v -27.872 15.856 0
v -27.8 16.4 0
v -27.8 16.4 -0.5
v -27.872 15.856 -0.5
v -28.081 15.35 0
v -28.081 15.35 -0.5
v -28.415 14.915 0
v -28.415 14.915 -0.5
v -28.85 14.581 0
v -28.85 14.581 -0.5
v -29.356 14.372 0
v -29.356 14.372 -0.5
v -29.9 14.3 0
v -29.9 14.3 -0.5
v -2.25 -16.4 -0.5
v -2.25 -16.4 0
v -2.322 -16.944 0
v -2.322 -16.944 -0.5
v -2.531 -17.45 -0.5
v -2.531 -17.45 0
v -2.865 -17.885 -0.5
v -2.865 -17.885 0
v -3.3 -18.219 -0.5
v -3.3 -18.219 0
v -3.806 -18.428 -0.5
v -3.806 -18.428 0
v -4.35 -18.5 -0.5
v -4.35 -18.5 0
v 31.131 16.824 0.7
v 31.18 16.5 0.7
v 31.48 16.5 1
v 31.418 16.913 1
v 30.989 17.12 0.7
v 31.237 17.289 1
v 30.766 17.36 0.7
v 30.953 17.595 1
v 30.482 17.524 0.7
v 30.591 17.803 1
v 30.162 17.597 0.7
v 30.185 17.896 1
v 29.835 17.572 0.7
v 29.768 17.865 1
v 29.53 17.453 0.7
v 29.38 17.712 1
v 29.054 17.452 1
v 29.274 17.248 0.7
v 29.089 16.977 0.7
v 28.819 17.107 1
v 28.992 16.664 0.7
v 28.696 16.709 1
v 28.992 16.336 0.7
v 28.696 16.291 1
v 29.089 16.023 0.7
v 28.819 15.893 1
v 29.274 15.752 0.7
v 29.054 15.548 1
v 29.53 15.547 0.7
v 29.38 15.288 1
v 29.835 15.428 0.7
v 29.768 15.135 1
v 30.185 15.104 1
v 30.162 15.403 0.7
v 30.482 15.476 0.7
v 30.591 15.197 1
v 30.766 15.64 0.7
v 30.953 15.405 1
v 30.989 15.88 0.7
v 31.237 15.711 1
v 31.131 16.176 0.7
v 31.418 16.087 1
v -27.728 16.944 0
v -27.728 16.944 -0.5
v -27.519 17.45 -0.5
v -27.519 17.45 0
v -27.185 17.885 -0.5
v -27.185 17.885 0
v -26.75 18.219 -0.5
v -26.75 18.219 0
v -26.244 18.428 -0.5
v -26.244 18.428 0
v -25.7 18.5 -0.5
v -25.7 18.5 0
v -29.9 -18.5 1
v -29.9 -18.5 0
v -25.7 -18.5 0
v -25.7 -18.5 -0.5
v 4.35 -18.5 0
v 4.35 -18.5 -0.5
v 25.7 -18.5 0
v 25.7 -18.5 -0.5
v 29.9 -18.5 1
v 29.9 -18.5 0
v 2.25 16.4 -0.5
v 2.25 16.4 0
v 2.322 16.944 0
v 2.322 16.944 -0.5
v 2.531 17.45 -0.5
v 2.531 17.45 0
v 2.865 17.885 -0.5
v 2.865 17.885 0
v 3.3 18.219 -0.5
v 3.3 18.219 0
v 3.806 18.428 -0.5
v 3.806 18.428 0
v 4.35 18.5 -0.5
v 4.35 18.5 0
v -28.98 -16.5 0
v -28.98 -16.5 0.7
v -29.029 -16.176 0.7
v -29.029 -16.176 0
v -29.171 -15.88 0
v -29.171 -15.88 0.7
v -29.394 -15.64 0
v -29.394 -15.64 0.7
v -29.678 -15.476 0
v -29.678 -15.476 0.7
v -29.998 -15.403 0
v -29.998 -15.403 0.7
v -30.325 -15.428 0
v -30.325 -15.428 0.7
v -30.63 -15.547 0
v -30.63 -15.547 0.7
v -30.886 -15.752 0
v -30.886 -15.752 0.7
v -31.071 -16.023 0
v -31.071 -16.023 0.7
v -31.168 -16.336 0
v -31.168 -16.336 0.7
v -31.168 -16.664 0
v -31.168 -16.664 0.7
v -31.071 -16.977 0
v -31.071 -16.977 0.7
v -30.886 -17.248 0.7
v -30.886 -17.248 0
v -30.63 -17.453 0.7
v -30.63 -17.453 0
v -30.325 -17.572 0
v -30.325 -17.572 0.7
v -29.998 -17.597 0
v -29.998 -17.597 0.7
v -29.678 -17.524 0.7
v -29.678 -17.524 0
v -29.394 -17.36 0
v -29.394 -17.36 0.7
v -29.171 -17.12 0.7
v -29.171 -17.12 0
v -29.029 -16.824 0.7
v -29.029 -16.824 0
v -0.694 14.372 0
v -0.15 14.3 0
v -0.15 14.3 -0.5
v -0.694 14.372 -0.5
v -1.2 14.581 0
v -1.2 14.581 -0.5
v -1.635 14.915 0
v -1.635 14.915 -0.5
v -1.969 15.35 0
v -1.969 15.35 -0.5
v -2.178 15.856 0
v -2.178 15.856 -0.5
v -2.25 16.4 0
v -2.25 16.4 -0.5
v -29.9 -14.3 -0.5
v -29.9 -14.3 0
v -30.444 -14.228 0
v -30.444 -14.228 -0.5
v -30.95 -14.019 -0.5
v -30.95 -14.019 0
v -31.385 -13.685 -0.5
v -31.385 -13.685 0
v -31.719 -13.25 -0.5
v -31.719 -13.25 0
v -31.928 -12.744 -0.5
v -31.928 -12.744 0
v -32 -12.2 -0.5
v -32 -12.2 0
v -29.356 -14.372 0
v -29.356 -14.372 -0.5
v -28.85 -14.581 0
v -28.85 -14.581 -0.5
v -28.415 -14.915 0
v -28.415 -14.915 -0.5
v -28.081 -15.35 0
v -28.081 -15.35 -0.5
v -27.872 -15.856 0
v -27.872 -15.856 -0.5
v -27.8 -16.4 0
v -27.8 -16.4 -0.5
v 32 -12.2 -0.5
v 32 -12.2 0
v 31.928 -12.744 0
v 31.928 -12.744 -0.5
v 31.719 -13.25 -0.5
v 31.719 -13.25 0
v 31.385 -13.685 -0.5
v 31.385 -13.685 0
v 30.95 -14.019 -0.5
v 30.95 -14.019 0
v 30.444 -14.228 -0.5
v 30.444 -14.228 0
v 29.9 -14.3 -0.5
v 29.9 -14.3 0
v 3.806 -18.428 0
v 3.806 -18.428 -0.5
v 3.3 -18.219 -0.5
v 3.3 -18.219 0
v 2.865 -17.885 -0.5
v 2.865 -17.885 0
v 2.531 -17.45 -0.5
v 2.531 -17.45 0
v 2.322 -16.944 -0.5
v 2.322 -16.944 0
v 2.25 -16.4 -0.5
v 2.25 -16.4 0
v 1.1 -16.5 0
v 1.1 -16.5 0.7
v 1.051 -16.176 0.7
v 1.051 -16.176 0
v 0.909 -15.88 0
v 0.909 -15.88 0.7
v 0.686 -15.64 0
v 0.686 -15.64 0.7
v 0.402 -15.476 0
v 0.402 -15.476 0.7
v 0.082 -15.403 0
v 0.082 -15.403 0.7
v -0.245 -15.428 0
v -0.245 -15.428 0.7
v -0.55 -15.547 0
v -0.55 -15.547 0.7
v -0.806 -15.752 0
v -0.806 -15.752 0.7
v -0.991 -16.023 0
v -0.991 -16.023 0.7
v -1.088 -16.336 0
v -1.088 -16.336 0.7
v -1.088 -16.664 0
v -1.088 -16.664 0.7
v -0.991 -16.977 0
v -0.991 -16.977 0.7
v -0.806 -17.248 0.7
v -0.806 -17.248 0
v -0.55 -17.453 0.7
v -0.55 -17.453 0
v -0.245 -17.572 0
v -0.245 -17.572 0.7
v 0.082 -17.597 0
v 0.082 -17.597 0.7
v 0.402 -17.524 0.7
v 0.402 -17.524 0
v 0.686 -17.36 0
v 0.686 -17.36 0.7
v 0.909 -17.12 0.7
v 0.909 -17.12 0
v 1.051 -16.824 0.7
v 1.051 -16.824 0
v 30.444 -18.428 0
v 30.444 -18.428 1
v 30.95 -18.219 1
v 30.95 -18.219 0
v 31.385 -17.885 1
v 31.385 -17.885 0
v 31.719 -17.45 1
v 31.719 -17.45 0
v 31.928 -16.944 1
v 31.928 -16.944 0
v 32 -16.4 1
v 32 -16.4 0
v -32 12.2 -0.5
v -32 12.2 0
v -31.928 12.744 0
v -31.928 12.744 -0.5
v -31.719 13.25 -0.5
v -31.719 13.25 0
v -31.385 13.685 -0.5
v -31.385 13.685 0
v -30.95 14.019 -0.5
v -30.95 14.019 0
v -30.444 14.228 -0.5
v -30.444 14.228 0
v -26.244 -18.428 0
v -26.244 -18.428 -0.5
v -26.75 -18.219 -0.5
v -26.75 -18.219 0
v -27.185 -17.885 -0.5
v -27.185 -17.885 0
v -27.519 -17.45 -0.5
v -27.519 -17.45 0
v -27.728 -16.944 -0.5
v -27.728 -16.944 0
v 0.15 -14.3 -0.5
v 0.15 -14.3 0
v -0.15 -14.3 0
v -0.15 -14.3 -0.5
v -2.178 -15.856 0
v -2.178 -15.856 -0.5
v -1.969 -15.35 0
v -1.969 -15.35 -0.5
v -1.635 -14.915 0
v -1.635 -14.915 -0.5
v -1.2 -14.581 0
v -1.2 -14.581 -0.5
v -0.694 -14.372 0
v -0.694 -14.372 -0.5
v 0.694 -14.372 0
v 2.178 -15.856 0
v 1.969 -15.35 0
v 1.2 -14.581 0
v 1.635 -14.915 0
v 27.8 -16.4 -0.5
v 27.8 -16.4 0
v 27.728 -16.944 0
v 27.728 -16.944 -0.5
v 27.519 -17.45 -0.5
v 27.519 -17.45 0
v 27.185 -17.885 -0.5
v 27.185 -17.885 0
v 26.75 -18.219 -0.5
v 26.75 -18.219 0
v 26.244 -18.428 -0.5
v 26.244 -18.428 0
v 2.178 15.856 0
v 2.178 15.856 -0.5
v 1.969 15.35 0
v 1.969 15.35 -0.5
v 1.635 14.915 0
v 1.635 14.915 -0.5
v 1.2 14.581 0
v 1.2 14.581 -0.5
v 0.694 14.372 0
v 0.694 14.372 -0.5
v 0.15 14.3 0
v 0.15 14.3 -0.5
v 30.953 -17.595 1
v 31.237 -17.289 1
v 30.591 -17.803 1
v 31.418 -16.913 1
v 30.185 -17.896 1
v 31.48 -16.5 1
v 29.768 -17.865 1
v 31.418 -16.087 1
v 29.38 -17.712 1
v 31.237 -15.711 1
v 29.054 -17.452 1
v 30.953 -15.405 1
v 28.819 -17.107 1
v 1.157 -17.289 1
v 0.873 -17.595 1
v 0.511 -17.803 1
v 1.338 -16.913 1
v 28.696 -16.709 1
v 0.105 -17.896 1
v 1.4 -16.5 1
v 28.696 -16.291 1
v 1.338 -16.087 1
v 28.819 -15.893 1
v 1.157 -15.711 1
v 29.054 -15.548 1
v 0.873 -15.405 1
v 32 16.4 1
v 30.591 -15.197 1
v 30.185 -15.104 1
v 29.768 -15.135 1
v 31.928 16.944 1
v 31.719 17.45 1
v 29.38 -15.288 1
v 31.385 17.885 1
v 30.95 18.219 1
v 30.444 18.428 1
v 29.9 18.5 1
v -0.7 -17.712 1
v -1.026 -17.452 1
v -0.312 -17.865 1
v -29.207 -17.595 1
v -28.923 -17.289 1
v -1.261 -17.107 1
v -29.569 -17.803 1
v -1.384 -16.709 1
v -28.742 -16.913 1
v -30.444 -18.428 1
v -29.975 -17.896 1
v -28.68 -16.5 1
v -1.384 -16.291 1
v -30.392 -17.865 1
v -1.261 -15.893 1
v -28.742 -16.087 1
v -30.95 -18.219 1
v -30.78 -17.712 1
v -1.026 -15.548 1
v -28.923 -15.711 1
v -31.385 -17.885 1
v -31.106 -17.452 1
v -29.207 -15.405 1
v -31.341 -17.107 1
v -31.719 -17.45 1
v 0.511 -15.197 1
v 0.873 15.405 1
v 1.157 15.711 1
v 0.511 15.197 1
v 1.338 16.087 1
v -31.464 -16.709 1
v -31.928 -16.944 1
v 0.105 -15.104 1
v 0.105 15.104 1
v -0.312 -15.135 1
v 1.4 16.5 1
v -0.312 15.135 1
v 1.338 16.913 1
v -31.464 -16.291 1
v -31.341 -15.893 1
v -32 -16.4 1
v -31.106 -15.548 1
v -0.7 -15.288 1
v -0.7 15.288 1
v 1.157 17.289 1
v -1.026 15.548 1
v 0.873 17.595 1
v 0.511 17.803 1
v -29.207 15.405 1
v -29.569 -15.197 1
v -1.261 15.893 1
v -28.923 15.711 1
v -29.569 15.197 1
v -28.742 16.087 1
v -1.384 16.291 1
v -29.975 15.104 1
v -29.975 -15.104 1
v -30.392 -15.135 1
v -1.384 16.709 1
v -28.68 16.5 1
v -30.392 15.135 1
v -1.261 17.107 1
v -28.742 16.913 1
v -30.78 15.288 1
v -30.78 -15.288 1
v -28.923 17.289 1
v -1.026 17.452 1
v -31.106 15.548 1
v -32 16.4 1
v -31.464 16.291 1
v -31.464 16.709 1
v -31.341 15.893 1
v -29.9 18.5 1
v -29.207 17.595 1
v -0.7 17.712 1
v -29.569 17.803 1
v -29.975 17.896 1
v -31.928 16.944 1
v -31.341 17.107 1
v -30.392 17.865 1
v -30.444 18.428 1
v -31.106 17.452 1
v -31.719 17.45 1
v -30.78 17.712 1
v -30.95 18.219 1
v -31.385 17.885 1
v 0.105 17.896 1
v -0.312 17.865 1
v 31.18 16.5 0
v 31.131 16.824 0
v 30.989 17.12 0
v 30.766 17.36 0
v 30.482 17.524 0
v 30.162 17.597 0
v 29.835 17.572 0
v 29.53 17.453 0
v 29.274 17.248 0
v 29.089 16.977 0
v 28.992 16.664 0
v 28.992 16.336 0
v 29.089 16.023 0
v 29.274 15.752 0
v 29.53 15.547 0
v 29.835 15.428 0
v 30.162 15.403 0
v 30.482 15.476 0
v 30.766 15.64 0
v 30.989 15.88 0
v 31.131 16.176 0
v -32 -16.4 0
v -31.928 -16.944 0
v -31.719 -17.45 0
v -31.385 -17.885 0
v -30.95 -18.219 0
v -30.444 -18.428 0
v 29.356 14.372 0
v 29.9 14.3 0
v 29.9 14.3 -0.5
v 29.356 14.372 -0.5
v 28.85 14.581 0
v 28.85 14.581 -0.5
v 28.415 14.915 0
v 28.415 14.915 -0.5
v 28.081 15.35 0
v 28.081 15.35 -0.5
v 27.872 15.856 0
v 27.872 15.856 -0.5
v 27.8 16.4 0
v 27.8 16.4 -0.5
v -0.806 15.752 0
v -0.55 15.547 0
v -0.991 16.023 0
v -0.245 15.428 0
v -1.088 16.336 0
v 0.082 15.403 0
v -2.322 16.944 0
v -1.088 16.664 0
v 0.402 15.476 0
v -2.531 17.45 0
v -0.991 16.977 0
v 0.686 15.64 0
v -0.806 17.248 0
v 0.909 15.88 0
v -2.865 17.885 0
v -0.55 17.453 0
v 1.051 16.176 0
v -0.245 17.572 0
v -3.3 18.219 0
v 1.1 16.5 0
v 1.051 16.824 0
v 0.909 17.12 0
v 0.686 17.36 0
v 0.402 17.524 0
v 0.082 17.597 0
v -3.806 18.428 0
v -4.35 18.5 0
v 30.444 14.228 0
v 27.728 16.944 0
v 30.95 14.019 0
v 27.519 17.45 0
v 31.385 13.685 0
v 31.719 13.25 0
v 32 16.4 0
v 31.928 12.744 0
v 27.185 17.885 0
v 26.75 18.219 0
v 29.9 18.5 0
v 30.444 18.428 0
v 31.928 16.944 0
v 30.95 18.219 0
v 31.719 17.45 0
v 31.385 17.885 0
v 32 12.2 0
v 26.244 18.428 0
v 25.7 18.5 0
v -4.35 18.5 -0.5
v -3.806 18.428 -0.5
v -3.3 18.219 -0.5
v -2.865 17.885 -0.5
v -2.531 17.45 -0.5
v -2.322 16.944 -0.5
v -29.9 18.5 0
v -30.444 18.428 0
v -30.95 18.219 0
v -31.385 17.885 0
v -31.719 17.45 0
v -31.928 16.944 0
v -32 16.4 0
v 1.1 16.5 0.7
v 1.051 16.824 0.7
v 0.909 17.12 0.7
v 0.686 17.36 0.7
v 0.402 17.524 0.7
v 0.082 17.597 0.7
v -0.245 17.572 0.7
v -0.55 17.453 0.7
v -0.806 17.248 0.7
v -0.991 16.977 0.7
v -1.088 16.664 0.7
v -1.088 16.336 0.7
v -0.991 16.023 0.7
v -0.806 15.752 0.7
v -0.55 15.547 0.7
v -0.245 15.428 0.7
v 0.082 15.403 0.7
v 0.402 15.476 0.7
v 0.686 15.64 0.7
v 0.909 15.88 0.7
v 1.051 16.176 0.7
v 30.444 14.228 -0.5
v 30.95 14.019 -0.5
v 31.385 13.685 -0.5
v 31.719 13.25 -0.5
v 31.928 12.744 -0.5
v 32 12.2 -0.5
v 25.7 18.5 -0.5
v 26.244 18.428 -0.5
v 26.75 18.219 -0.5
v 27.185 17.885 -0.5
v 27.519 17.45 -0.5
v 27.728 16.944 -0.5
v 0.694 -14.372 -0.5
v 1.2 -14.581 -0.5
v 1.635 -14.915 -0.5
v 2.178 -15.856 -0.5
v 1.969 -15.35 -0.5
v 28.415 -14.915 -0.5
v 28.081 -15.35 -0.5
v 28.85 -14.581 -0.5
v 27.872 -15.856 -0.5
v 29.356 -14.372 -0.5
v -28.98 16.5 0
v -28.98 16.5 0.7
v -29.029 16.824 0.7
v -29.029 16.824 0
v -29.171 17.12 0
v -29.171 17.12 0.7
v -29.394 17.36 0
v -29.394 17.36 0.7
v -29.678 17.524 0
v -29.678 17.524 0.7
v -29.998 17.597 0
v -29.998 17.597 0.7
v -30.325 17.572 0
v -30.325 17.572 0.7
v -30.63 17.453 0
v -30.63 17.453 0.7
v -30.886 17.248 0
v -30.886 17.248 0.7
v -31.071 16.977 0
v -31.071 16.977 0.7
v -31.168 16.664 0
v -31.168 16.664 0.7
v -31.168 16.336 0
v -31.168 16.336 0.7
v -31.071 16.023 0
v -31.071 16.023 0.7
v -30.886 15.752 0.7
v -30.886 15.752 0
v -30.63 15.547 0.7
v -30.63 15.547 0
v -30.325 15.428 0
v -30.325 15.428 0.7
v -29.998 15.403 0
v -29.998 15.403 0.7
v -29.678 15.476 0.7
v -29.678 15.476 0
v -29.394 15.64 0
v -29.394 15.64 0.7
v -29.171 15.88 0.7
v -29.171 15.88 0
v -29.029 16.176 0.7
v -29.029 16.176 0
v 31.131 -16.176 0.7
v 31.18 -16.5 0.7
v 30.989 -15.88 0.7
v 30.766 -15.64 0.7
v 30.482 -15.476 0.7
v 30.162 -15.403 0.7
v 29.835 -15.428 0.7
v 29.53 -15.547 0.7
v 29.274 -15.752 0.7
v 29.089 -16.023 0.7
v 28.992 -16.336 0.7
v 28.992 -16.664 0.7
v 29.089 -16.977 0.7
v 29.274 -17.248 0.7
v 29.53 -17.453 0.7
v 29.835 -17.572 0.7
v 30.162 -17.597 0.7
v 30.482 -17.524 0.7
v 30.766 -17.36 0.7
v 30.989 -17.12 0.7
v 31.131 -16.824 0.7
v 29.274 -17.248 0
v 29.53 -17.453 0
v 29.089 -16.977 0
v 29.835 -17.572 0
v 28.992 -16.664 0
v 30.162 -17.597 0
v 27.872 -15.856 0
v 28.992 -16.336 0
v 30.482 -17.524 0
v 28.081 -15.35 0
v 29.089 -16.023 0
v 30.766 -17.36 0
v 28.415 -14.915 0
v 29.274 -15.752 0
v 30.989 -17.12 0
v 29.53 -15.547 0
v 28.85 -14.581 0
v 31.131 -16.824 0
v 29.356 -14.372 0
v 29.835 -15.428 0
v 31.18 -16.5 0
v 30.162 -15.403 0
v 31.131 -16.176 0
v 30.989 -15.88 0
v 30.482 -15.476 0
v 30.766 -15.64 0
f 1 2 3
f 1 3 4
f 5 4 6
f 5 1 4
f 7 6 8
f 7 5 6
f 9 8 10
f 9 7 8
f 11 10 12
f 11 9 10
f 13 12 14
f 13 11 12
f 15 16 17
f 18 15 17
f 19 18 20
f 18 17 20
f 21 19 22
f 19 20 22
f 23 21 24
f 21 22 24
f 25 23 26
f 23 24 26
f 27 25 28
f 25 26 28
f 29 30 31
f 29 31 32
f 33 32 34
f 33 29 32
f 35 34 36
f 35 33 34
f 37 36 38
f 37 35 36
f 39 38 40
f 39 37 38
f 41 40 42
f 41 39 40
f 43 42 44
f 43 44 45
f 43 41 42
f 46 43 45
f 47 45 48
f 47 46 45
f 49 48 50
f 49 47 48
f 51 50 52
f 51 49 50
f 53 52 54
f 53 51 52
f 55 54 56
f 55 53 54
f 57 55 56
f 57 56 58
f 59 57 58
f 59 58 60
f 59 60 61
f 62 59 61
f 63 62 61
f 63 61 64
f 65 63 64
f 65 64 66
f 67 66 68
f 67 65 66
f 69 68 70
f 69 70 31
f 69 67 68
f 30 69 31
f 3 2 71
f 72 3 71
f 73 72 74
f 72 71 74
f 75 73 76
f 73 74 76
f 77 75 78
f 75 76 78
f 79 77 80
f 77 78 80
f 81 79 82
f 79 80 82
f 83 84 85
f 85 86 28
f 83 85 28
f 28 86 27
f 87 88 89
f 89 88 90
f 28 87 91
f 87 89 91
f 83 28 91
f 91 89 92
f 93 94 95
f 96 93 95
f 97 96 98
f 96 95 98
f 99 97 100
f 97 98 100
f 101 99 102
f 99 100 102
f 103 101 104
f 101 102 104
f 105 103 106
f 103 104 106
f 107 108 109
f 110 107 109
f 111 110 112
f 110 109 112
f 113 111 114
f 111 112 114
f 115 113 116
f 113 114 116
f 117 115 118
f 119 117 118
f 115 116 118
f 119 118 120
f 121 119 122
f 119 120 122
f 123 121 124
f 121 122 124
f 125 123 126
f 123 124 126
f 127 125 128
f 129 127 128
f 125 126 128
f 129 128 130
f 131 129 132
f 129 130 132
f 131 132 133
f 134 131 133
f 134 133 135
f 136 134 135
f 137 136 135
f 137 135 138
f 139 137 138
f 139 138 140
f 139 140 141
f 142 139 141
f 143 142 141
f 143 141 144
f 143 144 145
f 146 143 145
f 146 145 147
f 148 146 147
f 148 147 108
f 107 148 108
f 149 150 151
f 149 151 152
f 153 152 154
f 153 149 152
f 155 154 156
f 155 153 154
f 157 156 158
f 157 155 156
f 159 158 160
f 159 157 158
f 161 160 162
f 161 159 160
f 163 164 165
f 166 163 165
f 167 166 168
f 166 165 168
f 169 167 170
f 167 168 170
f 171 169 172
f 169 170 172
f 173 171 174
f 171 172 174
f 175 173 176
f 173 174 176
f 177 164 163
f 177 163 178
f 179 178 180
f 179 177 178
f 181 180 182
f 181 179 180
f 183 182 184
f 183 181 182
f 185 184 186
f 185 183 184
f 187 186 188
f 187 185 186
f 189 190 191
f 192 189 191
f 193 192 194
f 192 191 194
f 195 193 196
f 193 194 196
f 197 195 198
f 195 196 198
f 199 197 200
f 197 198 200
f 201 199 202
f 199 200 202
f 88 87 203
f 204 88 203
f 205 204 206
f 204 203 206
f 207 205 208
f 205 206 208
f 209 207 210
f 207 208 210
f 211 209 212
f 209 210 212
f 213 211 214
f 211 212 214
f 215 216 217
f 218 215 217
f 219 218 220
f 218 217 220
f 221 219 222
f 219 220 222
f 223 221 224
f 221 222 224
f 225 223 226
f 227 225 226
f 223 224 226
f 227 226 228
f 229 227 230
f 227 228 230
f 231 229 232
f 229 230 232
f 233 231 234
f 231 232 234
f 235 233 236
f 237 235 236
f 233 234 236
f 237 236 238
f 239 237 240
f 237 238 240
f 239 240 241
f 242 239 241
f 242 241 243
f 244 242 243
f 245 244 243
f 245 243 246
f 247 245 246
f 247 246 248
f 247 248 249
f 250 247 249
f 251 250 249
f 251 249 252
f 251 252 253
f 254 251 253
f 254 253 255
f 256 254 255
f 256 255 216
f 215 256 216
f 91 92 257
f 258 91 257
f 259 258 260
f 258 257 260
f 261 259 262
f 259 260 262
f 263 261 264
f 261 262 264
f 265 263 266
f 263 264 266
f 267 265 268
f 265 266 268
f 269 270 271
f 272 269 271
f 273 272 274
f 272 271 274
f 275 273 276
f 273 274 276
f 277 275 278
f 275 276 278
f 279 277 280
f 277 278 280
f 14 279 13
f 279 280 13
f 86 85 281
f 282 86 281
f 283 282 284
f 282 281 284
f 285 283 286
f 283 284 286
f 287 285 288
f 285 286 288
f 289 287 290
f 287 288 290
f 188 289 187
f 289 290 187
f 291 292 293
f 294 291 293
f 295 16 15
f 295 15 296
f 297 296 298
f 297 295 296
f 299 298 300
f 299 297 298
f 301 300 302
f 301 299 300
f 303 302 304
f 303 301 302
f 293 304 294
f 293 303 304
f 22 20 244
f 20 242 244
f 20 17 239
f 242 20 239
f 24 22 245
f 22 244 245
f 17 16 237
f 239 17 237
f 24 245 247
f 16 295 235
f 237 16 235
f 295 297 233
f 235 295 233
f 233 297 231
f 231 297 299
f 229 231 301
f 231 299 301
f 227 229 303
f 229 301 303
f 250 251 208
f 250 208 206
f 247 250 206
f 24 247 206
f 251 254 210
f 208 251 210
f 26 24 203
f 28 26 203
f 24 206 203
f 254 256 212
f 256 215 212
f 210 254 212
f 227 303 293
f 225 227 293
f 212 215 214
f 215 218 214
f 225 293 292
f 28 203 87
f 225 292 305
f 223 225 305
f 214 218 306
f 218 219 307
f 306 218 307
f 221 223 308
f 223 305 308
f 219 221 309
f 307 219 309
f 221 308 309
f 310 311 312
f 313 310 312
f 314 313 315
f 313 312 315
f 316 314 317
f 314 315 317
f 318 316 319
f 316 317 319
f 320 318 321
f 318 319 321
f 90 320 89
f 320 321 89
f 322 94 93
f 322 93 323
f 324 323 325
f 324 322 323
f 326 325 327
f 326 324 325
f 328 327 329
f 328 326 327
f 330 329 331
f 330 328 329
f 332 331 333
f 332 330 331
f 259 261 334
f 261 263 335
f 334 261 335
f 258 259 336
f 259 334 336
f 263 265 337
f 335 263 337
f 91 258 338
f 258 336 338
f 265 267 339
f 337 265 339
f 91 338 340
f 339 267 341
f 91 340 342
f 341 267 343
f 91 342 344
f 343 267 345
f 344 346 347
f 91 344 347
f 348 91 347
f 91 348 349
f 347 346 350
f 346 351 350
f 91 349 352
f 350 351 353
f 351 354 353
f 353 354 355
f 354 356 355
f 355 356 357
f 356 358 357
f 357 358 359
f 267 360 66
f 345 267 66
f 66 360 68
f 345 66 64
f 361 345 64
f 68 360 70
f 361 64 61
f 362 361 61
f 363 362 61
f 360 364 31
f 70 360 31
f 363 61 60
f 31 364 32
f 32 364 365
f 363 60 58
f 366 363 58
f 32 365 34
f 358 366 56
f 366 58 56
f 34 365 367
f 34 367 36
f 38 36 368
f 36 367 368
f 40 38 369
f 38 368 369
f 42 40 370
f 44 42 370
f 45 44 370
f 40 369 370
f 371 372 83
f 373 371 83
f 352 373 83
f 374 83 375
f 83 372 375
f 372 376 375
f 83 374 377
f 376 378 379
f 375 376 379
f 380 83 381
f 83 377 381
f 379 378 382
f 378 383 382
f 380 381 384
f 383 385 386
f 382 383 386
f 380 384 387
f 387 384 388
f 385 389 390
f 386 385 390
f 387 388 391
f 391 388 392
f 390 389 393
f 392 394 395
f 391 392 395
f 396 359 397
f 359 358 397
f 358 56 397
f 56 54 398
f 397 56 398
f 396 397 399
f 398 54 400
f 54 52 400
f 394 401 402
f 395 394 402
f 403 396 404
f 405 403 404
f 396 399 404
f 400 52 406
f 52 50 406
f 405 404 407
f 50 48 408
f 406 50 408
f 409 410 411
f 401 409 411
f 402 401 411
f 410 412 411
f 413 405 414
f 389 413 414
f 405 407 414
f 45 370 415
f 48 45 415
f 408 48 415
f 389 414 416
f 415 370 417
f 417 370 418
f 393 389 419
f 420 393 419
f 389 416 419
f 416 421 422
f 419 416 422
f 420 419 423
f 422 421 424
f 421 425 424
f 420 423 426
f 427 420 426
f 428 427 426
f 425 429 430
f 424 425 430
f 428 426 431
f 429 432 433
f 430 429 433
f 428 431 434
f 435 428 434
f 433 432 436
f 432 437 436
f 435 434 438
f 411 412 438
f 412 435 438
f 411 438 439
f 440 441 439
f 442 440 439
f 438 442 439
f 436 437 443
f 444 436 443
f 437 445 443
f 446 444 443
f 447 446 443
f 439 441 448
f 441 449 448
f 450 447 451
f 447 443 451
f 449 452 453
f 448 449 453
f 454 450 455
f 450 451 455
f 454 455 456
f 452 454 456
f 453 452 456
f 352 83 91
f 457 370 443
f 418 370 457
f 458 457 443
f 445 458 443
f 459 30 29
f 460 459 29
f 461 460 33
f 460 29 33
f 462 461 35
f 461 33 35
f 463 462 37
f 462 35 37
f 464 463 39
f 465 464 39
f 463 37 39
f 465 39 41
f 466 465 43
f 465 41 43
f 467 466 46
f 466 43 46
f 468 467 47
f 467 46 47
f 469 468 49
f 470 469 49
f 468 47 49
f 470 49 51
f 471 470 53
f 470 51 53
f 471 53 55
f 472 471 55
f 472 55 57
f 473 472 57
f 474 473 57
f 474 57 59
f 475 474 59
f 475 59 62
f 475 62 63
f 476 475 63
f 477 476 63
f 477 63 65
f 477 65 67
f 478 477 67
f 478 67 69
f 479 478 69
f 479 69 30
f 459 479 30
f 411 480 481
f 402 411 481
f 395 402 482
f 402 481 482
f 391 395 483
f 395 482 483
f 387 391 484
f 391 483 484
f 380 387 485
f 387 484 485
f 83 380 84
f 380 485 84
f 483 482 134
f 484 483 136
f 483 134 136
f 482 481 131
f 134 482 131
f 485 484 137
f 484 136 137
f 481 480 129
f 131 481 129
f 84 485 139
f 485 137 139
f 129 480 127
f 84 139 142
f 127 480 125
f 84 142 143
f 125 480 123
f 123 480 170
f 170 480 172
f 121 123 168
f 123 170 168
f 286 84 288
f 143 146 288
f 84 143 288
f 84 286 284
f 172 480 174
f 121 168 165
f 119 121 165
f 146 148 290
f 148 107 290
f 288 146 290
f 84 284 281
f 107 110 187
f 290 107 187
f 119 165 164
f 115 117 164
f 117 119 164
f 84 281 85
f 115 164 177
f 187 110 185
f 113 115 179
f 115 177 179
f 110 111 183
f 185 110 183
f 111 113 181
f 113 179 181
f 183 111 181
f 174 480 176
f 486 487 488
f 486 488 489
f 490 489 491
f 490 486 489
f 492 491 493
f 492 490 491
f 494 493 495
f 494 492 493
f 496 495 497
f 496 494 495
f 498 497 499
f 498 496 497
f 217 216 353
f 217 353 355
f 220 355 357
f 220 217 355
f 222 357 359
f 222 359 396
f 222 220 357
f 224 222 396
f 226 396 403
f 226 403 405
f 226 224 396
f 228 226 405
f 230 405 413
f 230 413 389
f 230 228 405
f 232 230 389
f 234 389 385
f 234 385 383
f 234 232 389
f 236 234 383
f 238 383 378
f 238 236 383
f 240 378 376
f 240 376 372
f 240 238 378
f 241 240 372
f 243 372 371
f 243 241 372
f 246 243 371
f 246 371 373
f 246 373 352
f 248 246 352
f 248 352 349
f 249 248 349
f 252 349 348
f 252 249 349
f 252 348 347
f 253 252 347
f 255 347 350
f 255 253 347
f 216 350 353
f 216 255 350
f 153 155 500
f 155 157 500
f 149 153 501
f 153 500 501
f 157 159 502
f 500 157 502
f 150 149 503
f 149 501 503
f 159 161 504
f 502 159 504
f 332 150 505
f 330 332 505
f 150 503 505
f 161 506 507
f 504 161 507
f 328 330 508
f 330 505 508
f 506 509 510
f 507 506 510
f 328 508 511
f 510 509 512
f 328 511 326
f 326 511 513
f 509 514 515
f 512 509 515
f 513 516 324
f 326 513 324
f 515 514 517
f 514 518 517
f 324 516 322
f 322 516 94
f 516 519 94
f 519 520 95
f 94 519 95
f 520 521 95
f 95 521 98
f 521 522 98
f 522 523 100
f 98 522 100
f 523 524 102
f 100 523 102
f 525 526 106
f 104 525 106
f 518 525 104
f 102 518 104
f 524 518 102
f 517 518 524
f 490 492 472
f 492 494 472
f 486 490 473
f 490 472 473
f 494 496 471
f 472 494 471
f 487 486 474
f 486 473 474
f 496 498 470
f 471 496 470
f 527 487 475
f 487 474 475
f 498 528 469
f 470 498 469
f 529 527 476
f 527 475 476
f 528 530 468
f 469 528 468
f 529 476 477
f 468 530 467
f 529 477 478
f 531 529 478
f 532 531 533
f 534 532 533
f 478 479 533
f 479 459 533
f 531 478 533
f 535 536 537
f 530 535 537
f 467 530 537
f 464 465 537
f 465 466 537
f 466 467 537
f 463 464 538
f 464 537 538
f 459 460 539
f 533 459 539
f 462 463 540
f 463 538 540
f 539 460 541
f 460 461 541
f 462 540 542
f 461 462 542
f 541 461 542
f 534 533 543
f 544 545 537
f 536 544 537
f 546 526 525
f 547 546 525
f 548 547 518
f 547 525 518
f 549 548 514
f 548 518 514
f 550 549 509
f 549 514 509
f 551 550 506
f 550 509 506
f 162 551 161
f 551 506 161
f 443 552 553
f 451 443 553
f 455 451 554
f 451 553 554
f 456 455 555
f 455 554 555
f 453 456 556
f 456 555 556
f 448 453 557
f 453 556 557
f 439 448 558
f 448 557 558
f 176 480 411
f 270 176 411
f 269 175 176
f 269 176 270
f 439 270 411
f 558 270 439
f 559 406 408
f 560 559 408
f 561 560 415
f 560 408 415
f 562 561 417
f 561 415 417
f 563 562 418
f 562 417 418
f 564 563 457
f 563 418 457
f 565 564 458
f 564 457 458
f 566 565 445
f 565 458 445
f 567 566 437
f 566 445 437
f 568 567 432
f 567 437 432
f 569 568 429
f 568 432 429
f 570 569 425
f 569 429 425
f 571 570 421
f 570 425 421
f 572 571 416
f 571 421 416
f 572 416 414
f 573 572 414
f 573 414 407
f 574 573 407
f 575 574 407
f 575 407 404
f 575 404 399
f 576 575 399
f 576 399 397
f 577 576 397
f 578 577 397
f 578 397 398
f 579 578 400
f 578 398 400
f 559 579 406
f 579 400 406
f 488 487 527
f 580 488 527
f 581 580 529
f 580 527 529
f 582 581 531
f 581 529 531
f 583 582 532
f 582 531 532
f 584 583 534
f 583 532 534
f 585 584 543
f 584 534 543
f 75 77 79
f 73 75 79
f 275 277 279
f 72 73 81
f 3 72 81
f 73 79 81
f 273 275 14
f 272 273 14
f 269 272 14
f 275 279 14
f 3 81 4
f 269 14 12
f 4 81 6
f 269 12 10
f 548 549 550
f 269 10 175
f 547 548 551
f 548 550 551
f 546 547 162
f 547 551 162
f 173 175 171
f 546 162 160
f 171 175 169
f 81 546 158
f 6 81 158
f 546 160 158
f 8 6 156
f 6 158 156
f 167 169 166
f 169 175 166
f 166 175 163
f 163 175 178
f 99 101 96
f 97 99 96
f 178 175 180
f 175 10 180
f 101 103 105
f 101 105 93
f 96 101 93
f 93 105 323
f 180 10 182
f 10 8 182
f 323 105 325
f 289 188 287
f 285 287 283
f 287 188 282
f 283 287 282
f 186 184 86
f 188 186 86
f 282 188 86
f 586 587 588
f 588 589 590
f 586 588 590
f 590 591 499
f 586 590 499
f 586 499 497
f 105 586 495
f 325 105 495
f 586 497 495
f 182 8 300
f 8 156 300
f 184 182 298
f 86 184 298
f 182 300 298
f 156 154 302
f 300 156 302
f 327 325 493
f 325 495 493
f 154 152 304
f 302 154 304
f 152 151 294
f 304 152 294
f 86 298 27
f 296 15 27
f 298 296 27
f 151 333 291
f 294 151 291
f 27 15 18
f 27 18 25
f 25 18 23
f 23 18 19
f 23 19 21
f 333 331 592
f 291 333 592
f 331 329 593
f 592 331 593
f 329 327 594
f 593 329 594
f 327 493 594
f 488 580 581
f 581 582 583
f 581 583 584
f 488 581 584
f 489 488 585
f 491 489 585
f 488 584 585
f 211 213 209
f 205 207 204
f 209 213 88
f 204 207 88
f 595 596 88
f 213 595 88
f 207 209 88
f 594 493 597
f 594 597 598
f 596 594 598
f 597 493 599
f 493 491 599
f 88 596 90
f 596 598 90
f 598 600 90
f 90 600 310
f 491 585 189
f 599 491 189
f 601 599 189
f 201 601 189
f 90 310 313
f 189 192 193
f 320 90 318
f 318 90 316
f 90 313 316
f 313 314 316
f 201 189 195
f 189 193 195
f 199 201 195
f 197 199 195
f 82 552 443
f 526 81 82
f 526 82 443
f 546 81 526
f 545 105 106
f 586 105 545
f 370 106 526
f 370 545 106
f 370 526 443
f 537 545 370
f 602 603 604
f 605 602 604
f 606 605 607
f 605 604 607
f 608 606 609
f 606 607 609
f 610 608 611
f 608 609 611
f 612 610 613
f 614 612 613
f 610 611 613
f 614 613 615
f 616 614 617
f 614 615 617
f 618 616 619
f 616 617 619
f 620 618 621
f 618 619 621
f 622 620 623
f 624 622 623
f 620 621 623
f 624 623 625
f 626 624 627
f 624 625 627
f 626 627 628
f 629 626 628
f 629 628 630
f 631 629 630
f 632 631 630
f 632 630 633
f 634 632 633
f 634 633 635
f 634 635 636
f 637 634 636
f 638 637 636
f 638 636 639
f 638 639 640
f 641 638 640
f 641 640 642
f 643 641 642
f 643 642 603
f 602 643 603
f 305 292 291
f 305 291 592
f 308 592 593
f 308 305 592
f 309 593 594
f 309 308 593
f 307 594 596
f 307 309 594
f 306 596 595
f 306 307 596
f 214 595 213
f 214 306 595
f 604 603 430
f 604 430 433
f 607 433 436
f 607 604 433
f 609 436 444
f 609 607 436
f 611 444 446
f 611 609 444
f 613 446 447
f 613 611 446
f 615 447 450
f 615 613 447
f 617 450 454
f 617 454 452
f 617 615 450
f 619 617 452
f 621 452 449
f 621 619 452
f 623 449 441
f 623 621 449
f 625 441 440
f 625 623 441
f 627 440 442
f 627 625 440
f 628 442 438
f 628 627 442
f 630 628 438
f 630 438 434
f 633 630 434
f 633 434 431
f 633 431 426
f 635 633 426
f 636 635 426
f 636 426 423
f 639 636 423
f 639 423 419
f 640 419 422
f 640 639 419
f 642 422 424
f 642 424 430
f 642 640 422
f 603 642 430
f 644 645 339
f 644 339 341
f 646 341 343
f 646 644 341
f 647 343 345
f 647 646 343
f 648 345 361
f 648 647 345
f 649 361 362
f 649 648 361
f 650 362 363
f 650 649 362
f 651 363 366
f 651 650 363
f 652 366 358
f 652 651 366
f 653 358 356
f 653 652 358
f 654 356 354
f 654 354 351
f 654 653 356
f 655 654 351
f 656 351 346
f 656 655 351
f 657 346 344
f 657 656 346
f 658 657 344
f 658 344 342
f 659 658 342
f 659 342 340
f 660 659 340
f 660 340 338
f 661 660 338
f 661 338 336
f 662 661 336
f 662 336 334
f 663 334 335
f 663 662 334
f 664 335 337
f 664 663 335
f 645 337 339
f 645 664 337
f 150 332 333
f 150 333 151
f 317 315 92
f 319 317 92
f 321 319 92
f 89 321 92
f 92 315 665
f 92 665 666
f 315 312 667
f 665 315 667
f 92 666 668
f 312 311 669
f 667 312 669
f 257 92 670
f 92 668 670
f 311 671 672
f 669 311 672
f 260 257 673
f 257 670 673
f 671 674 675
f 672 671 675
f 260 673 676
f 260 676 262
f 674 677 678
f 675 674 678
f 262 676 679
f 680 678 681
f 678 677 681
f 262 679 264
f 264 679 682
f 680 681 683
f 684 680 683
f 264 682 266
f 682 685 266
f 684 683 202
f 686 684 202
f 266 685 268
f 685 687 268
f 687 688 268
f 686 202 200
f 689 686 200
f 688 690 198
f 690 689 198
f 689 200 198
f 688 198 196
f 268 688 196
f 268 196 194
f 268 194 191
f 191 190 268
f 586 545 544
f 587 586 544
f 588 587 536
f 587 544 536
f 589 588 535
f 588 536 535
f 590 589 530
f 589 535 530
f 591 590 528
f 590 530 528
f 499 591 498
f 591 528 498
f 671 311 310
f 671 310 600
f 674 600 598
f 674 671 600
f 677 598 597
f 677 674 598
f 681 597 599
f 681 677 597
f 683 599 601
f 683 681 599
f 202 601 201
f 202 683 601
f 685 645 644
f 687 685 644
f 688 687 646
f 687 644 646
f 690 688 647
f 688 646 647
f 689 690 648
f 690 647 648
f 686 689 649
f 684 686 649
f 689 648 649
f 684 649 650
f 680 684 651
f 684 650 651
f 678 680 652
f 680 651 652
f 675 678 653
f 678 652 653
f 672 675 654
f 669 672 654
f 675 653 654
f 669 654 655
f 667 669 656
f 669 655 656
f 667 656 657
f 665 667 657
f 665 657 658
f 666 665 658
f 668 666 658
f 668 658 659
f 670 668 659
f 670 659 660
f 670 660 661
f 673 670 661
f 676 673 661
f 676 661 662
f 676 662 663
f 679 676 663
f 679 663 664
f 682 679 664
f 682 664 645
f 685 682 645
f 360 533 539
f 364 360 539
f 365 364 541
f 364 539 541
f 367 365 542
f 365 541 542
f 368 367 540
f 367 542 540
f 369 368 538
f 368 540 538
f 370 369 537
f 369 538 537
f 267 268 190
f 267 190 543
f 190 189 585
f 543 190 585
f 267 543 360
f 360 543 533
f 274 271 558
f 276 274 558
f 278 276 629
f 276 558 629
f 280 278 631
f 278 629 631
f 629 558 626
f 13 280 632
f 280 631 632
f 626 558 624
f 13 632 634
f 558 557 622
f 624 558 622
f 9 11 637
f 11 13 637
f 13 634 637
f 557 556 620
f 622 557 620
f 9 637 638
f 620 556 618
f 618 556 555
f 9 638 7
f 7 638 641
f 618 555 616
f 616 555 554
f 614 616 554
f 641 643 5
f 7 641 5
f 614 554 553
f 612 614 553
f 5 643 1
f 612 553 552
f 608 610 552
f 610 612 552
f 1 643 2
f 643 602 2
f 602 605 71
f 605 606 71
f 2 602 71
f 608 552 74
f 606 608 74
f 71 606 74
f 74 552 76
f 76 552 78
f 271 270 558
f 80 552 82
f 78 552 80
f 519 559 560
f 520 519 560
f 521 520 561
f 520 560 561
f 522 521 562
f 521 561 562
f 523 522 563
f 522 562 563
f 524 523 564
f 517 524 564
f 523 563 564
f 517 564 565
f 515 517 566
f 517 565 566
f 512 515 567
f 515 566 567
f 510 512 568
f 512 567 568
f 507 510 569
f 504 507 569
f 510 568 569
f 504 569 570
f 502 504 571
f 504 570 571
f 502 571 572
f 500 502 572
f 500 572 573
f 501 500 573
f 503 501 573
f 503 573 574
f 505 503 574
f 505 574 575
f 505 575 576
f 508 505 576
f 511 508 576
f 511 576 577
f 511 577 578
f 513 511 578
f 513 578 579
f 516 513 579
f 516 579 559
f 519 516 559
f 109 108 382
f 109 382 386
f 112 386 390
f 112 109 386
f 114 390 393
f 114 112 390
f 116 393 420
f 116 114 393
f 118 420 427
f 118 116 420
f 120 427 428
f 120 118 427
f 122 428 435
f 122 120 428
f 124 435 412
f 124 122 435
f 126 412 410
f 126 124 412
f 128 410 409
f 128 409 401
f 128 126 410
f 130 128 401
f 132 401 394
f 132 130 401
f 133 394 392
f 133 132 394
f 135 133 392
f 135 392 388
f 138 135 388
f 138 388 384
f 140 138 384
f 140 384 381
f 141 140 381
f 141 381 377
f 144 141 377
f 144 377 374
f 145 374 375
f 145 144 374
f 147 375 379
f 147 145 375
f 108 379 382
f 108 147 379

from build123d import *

# Parameters (mm, degrees)
SKETCH_1_W          = 64
SKETCH_1_H          = 37
EXTRUDE_1_DEPTH     = 1
SKETCH_2_W          = 4.2
SKETCH_2_H          = 28.6
SKETCH_2_W_2        = 25.55
SKETCH_2_H_2        = 4.2
SKETCH_2_W_3        = 4.5
EXTRUDE_2_DEPTH     = 0.5
FILLET_1_R          = 2.1
CUT_EXTRUDE_1_REACH = 38.993
SKETCH_3_R          = 1.1
CHAMFER_1_SIZE      = 0.3


with BuildPart() as part:
    # 스케치1 → 보스-돌출1 (new body)
    with BuildSketch(Plane.XY):
        Rectangle(SKETCH_1_W, SKETCH_1_H)
    extrude(amount=EXTRUDE_1_DEPTH)

    # 스케치2 → 보스-돌출2 (add)
    with BuildSketch(Plane(origin=(0, 0, 0), x_dir=(-1, 0, 0), z_dir=(0, 0, -1))):
        with Locations((-29.9, 0)):
            Rectangle(SKETCH_2_W, SKETCH_2_H)
        with Locations((-15.025, 0)):
            Rectangle(SKETCH_2_W_2, SKETCH_2_H)
        with Locations((-15.025, 16.4)):
            Rectangle(SKETCH_2_W_2, SKETCH_2_H_2)
        with Locations((-15.025, -16.4)):
            Rectangle(SKETCH_2_W_2, SKETCH_2_H_2)
        with Locations((15.025, 0)):
            Rectangle(SKETCH_2_W_2, SKETCH_2_H)
        with Locations((15.025, 16.4)):
            Rectangle(SKETCH_2_W_2, SKETCH_2_H_2)
        Rectangle(SKETCH_2_W_3, SKETCH_2_H)
        with Locations((29.9, 0)):
            Rectangle(SKETCH_2_W, SKETCH_2_H)
        with Locations((15.025, -16.4)):
            Rectangle(SKETCH_2_W_2, SKETCH_2_H_2)
    extrude(amount=EXTRUDE_2_DEPTH)

    # 필렛1
    # the kernel refuses this fillet: 2.1 mm, written as the material it adds along each edge
    with BuildSketch(Plane(origin=(27.8, -14.3, 5.25), x_dir=(0, -1, 0), z_dir=(0, 0, -1))) as fillet_1_piece_1_section:
        with BuildLine():
            CenterArc((FILLET_1_R, -FILLET_1_R), FILLET_1_R, 90, 90)
            Line((0, -FILLET_1_R), (0, 0))
            Line((0, 0), (FILLET_1_R, 0))
        make_face()
    fillet_1_piece_1 = extrude(amount=5.75, mode=Mode.PRIVATE)
    fillet_1_piece_1 = split(fillet_1_piece_1, bisect_by=Plane(origin=(28.269072672, -14.769072672, 1), z_dir=(0, 0, -1)), keep=Keep.TOP, mode=Mode.PRIVATE)
    add(fillet_1_piece_1)
    with BuildSketch(Plane(origin=(-2.25, -14.3, 5.25), x_dir=(0, -1, 0), z_dir=(0, 0, -1))) as fillet_1_piece_2_section:
        with BuildLine():
            CenterArc((FILLET_1_R, -FILLET_1_R), FILLET_1_R, 90, 90)
            Line((0, -FILLET_1_R), (0, 0))
            Line((0, 0), (FILLET_1_R, 0))
        make_face()
    fillet_1_piece_2 = extrude(amount=5.75, mode=Mode.PRIVATE)
    fillet_1_piece_2 = split(fillet_1_piece_2, bisect_by=Plane(origin=(-1.780927328, -14.769072672, 1), z_dir=(0, 0, -1)), keep=Keep.TOP, mode=Mode.PRIVATE)
    add(fillet_1_piece_2)
    with BuildSketch(Plane(origin=(2.25, -14.3, 5.25), x_dir=(-1, 0, 0), z_dir=(0, 0, -1))) as fillet_1_piece_3_section:
        with BuildLine():
            CenterArc((FILLET_1_R, -FILLET_1_R), FILLET_1_R, 90, 90)
            Line((0, -FILLET_1_R), (0, 0))
            Line((0, 0), (FILLET_1_R, 0))
        make_face()
    fillet_1_piece_3 = extrude(amount=5.75, mode=Mode.PRIVATE)
    fillet_1_piece_3 = split(fillet_1_piece_3, bisect_by=Plane(origin=(1.780927328, -14.769072672, 1), z_dir=(0, 0, -1)), keep=Keep.TOP, mode=Mode.PRIVATE)
    add(fillet_1_piece_3)
    with BuildSketch(Plane(origin=(-27.8, -14.3, 5.25), x_dir=(-1, 0, 0), z_dir=(0, 0, -1))) as fillet_1_piece_4_section:
        with BuildLine():
            CenterArc((FILLET_1_R, -FILLET_1_R), FILLET_1_R, 90, 90)
            Line((0, -FILLET_1_R), (0, 0))
            Line((0, 0), (FILLET_1_R, 0))
        make_face()
    fillet_1_piece_4 = extrude(amount=5.75, mode=Mode.PRIVATE)
    fillet_1_piece_4 = split(fillet_1_piece_4, bisect_by=Plane(origin=(-28.269072672, -14.769072672, 1), z_dir=(0, 0, -1)), keep=Keep.TOP, mode=Mode.PRIVATE)
    add(fillet_1_piece_4)
    with BuildSketch(Plane(origin=(27.8, 14.3, 0), x_dir=(1, 0, 0), z_dir=(0, 0, -1)), Plane(origin=(-27.8, 14.3, 0), x_dir=(0, 1, 0), z_dir=(0, 0, -1))) as fillet_1_piece_5:
        with BuildLine():
            CenterArc((FILLET_1_R, -FILLET_1_R), FILLET_1_R, 90, 90)
            Line((0, -FILLET_1_R), (0, 0))
            Line((0, 0), (FILLET_1_R, 0))
        make_face()
    extrude(amount=0.5)
    with BuildSketch(Plane(origin=(-2.25, 14.3, 0), x_dir=(0, 1, 0), z_dir=(0, 0, -1)), Plane(origin=(2.25, 14.3, 0), x_dir=(-1, 0, 0), z_dir=(0, 0, -1))) as fillet_1_piece_6:
        with BuildLine():
            CenterArc((FILLET_1_R, FILLET_1_R), FILLET_1_R, 180, 90)
            Line((0, FILLET_1_R), (0, 0))
            Line((0, 0), (FILLET_1_R, 0))
        make_face()
    extrude(amount=0.5)
    # the kernel refuses this fillet: 2.1 mm, written as the material it takes off along each edge
    with BuildSketch(Plane(origin=(32, -18.5, -5.25), x_dir=(-1, 0, 0), z_dir=(0, 0, 1)), Plane(origin=(32, 18.5, -5.25), x_dir=(0, -1, 0), z_dir=(0, 0, 1))) as fillet_1_2_piece_1:
        with BuildLine():
            CenterArc((FILLET_1_R, -FILLET_1_R), FILLET_1_R, 90, 90)
            Line((0, -FILLET_1_R), (0, 0))
            Line((0, 0), (FILLET_1_R, 0))
        make_face()
    extrude(amount=11.5, mode=Mode.SUBTRACT)
    with BuildSketch(Plane(origin=(32, -14.3, 0), x_dir=(0, 1, 0), z_dir=(0, 0, -1)), Plane(origin=(27.8, 18.5, 0), x_dir=(-1, 0, 0), z_dir=(0, 0, -1)), Plane(origin=(-2.25, 18.5, 0), x_dir=(-1, 0, 0), z_dir=(0, 0, -1)), Plane(origin=(2.25, -18.5, 0), x_dir=(1, 0, 0), z_dir=(0, 0, -1)), Plane(origin=(-27.8, -18.5, 0), x_dir=(1, 0, 0), z_dir=(0, 0, -1)), Plane(origin=(-32, 14.3, 0), x_dir=(0, -1, 0), z_dir=(0, 0, -1))) as fillet_1_2_piece_2:
        with BuildLine():
            CenterArc((FILLET_1_R, -FILLET_1_R), FILLET_1_R, 90, 90)
            Line((0, -FILLET_1_R), (0, 0))
            Line((0, 0), (FILLET_1_R, 0))
        make_face()
    extrude(amount=5.75, mode=Mode.SUBTRACT)
    with BuildSketch(Plane(origin=(-32, -14.3, 0), x_dir=(0, 1, 0), z_dir=(0, 0, -1)), Plane(origin=(27.8, -18.5, 0), x_dir=(-1, 0, 0), z_dir=(0, 0, -1)), Plane(origin=(-2.25, -18.5, 0), x_dir=(-1, 0, 0), z_dir=(0, 0, -1)), Plane(origin=(2.25, 18.5, 0), x_dir=(1, 0, 0), z_dir=(0, 0, -1)), Plane(origin=(-27.8, 18.5, 0), x_dir=(1, 0, 0), z_dir=(0, 0, -1)), Plane(origin=(32, 14.3, 0), x_dir=(0, -1, 0), z_dir=(0, 0, -1))) as fillet_1_2_piece_3:
        with BuildLine():
            CenterArc((FILLET_1_R, FILLET_1_R), FILLET_1_R, 180, 90)
            Line((0, FILLET_1_R), (0, 0))
            Line((0, 0), (FILLET_1_R, 0))
        make_face()
    extrude(amount=5.75, mode=Mode.SUBTRACT)
    with BuildSketch(Plane(origin=(-32, -18.5, -5.25), x_dir=(1, 0, 0), z_dir=(0, 0, 1)), Plane(origin=(-32, 18.5, -5.25), x_dir=(0, -1, 0), z_dir=(0, 0, 1))) as fillet_1_2_piece_4:
        with BuildLine():
            CenterArc((FILLET_1_R, FILLET_1_R), FILLET_1_R, 180, 90)
            Line((0, FILLET_1_R), (0, 0))
            Line((0, 0), (FILLET_1_R, 0))
        make_face()
    extrude(amount=11.5, mode=Mode.SUBTRACT)

    # 스케치3 → 컷-돌출1 (cut, up to next)
    with BuildSketch(Plane.XY.offset(1), mode=Mode.PRIVATE) as cut_extrude_1_sk1:
        with Locations((-30.08, 16.5)):
            Circle(SKETCH_3_R)
    cut_extrude_1_tool1 = extrude(cut_extrude_1_sk1.sketch, amount=-CUT_EXTRUDE_1_REACH, mode=Mode.PRIVATE) & part.part
    # 스케치3 → 컷-돌출1 (cut, up to next)
    with BuildSketch(Plane.XY.offset(1), mode=Mode.PRIVATE) as cut_extrude_1_sk2:
        with Locations((0, 16.5)):
            Circle(SKETCH_3_R)
    cut_extrude_1_tool2 = extrude(cut_extrude_1_sk2.sketch, amount=-CUT_EXTRUDE_1_REACH, mode=Mode.PRIVATE) & part.part
    # 스케치3 → 컷-돌출1 (cut, up to next)
    with BuildSketch(Plane.XY.offset(1), mode=Mode.PRIVATE) as cut_extrude_1_sk3:
        with Locations((30.08, 16.5)):
            Circle(SKETCH_3_R)
    cut_extrude_1_tool3 = extrude(cut_extrude_1_sk3.sketch, amount=-CUT_EXTRUDE_1_REACH, mode=Mode.PRIVATE) & part.part
    # 스케치3 → 컷-돌출1 (cut, up to next)
    with BuildSketch(Plane.XY.offset(1), mode=Mode.PRIVATE) as cut_extrude_1_sk4:
        with Locations((30.08, -16.5)):
            Circle(SKETCH_3_R)
    cut_extrude_1_tool4 = extrude(cut_extrude_1_sk4.sketch, amount=-CUT_EXTRUDE_1_REACH, mode=Mode.PRIVATE) & part.part
    # 스케치3 → 컷-돌출1 (cut, up to next)
    with BuildSketch(Plane.XY.offset(1), mode=Mode.PRIVATE) as cut_extrude_1_sk5:
        with Locations((-30.08, -16.5)):
            Circle(SKETCH_3_R)
    cut_extrude_1_tool5 = extrude(cut_extrude_1_sk5.sketch, amount=-CUT_EXTRUDE_1_REACH, mode=Mode.PRIVATE) & part.part
    # 스케치3 → 컷-돌출1 (cut, up to next)
    with BuildSketch(Plane.XY.offset(1), mode=Mode.PRIVATE) as cut_extrude_1_sk6:
        with Locations((0, -16.5)):
            Circle(SKETCH_3_R)
    cut_extrude_1_tool6 = extrude(cut_extrude_1_sk6.sketch, amount=-CUT_EXTRUDE_1_REACH, mode=Mode.PRIVATE) & part.part
    add(cut_extrude_1_tool1.solids().sort_by_distance((-30.08, 16.5, 1))[0], mode=Mode.SUBTRACT)
    add(cut_extrude_1_tool2.solids().sort_by_distance((0, 16.5, 1))[0], mode=Mode.SUBTRACT)
    add(cut_extrude_1_tool3.solids().sort_by_distance((30.08, 16.5, 1))[0], mode=Mode.SUBTRACT)
    add(cut_extrude_1_tool4.solids().sort_by_distance((30.08, -16.5, 1))[0], mode=Mode.SUBTRACT)
    add(cut_extrude_1_tool5.solids().sort_by_distance((-30.08, -16.5, 1))[0], mode=Mode.SUBTRACT)
    add(cut_extrude_1_tool6.solids().sort_by_distance((0, -16.5, 1))[0], mode=Mode.SUBTRACT)

    # 모따기1
    chamfer_1_edges = [part.edges().sort_by_distance(p)[0] for p in [
        (-1.1, 16.5, 1),
        (28.98, 16.5, 1),
        (28.98, -16.5, 1),
        (-31.18, -16.5, 1),
        (-1.1, -16.5, 1),
        (-31.18, 16.5, 1),
    ]]
    chamfer(chamfer_1_edges, length=CHAMFER_1_SIZE)


solid = part.part
